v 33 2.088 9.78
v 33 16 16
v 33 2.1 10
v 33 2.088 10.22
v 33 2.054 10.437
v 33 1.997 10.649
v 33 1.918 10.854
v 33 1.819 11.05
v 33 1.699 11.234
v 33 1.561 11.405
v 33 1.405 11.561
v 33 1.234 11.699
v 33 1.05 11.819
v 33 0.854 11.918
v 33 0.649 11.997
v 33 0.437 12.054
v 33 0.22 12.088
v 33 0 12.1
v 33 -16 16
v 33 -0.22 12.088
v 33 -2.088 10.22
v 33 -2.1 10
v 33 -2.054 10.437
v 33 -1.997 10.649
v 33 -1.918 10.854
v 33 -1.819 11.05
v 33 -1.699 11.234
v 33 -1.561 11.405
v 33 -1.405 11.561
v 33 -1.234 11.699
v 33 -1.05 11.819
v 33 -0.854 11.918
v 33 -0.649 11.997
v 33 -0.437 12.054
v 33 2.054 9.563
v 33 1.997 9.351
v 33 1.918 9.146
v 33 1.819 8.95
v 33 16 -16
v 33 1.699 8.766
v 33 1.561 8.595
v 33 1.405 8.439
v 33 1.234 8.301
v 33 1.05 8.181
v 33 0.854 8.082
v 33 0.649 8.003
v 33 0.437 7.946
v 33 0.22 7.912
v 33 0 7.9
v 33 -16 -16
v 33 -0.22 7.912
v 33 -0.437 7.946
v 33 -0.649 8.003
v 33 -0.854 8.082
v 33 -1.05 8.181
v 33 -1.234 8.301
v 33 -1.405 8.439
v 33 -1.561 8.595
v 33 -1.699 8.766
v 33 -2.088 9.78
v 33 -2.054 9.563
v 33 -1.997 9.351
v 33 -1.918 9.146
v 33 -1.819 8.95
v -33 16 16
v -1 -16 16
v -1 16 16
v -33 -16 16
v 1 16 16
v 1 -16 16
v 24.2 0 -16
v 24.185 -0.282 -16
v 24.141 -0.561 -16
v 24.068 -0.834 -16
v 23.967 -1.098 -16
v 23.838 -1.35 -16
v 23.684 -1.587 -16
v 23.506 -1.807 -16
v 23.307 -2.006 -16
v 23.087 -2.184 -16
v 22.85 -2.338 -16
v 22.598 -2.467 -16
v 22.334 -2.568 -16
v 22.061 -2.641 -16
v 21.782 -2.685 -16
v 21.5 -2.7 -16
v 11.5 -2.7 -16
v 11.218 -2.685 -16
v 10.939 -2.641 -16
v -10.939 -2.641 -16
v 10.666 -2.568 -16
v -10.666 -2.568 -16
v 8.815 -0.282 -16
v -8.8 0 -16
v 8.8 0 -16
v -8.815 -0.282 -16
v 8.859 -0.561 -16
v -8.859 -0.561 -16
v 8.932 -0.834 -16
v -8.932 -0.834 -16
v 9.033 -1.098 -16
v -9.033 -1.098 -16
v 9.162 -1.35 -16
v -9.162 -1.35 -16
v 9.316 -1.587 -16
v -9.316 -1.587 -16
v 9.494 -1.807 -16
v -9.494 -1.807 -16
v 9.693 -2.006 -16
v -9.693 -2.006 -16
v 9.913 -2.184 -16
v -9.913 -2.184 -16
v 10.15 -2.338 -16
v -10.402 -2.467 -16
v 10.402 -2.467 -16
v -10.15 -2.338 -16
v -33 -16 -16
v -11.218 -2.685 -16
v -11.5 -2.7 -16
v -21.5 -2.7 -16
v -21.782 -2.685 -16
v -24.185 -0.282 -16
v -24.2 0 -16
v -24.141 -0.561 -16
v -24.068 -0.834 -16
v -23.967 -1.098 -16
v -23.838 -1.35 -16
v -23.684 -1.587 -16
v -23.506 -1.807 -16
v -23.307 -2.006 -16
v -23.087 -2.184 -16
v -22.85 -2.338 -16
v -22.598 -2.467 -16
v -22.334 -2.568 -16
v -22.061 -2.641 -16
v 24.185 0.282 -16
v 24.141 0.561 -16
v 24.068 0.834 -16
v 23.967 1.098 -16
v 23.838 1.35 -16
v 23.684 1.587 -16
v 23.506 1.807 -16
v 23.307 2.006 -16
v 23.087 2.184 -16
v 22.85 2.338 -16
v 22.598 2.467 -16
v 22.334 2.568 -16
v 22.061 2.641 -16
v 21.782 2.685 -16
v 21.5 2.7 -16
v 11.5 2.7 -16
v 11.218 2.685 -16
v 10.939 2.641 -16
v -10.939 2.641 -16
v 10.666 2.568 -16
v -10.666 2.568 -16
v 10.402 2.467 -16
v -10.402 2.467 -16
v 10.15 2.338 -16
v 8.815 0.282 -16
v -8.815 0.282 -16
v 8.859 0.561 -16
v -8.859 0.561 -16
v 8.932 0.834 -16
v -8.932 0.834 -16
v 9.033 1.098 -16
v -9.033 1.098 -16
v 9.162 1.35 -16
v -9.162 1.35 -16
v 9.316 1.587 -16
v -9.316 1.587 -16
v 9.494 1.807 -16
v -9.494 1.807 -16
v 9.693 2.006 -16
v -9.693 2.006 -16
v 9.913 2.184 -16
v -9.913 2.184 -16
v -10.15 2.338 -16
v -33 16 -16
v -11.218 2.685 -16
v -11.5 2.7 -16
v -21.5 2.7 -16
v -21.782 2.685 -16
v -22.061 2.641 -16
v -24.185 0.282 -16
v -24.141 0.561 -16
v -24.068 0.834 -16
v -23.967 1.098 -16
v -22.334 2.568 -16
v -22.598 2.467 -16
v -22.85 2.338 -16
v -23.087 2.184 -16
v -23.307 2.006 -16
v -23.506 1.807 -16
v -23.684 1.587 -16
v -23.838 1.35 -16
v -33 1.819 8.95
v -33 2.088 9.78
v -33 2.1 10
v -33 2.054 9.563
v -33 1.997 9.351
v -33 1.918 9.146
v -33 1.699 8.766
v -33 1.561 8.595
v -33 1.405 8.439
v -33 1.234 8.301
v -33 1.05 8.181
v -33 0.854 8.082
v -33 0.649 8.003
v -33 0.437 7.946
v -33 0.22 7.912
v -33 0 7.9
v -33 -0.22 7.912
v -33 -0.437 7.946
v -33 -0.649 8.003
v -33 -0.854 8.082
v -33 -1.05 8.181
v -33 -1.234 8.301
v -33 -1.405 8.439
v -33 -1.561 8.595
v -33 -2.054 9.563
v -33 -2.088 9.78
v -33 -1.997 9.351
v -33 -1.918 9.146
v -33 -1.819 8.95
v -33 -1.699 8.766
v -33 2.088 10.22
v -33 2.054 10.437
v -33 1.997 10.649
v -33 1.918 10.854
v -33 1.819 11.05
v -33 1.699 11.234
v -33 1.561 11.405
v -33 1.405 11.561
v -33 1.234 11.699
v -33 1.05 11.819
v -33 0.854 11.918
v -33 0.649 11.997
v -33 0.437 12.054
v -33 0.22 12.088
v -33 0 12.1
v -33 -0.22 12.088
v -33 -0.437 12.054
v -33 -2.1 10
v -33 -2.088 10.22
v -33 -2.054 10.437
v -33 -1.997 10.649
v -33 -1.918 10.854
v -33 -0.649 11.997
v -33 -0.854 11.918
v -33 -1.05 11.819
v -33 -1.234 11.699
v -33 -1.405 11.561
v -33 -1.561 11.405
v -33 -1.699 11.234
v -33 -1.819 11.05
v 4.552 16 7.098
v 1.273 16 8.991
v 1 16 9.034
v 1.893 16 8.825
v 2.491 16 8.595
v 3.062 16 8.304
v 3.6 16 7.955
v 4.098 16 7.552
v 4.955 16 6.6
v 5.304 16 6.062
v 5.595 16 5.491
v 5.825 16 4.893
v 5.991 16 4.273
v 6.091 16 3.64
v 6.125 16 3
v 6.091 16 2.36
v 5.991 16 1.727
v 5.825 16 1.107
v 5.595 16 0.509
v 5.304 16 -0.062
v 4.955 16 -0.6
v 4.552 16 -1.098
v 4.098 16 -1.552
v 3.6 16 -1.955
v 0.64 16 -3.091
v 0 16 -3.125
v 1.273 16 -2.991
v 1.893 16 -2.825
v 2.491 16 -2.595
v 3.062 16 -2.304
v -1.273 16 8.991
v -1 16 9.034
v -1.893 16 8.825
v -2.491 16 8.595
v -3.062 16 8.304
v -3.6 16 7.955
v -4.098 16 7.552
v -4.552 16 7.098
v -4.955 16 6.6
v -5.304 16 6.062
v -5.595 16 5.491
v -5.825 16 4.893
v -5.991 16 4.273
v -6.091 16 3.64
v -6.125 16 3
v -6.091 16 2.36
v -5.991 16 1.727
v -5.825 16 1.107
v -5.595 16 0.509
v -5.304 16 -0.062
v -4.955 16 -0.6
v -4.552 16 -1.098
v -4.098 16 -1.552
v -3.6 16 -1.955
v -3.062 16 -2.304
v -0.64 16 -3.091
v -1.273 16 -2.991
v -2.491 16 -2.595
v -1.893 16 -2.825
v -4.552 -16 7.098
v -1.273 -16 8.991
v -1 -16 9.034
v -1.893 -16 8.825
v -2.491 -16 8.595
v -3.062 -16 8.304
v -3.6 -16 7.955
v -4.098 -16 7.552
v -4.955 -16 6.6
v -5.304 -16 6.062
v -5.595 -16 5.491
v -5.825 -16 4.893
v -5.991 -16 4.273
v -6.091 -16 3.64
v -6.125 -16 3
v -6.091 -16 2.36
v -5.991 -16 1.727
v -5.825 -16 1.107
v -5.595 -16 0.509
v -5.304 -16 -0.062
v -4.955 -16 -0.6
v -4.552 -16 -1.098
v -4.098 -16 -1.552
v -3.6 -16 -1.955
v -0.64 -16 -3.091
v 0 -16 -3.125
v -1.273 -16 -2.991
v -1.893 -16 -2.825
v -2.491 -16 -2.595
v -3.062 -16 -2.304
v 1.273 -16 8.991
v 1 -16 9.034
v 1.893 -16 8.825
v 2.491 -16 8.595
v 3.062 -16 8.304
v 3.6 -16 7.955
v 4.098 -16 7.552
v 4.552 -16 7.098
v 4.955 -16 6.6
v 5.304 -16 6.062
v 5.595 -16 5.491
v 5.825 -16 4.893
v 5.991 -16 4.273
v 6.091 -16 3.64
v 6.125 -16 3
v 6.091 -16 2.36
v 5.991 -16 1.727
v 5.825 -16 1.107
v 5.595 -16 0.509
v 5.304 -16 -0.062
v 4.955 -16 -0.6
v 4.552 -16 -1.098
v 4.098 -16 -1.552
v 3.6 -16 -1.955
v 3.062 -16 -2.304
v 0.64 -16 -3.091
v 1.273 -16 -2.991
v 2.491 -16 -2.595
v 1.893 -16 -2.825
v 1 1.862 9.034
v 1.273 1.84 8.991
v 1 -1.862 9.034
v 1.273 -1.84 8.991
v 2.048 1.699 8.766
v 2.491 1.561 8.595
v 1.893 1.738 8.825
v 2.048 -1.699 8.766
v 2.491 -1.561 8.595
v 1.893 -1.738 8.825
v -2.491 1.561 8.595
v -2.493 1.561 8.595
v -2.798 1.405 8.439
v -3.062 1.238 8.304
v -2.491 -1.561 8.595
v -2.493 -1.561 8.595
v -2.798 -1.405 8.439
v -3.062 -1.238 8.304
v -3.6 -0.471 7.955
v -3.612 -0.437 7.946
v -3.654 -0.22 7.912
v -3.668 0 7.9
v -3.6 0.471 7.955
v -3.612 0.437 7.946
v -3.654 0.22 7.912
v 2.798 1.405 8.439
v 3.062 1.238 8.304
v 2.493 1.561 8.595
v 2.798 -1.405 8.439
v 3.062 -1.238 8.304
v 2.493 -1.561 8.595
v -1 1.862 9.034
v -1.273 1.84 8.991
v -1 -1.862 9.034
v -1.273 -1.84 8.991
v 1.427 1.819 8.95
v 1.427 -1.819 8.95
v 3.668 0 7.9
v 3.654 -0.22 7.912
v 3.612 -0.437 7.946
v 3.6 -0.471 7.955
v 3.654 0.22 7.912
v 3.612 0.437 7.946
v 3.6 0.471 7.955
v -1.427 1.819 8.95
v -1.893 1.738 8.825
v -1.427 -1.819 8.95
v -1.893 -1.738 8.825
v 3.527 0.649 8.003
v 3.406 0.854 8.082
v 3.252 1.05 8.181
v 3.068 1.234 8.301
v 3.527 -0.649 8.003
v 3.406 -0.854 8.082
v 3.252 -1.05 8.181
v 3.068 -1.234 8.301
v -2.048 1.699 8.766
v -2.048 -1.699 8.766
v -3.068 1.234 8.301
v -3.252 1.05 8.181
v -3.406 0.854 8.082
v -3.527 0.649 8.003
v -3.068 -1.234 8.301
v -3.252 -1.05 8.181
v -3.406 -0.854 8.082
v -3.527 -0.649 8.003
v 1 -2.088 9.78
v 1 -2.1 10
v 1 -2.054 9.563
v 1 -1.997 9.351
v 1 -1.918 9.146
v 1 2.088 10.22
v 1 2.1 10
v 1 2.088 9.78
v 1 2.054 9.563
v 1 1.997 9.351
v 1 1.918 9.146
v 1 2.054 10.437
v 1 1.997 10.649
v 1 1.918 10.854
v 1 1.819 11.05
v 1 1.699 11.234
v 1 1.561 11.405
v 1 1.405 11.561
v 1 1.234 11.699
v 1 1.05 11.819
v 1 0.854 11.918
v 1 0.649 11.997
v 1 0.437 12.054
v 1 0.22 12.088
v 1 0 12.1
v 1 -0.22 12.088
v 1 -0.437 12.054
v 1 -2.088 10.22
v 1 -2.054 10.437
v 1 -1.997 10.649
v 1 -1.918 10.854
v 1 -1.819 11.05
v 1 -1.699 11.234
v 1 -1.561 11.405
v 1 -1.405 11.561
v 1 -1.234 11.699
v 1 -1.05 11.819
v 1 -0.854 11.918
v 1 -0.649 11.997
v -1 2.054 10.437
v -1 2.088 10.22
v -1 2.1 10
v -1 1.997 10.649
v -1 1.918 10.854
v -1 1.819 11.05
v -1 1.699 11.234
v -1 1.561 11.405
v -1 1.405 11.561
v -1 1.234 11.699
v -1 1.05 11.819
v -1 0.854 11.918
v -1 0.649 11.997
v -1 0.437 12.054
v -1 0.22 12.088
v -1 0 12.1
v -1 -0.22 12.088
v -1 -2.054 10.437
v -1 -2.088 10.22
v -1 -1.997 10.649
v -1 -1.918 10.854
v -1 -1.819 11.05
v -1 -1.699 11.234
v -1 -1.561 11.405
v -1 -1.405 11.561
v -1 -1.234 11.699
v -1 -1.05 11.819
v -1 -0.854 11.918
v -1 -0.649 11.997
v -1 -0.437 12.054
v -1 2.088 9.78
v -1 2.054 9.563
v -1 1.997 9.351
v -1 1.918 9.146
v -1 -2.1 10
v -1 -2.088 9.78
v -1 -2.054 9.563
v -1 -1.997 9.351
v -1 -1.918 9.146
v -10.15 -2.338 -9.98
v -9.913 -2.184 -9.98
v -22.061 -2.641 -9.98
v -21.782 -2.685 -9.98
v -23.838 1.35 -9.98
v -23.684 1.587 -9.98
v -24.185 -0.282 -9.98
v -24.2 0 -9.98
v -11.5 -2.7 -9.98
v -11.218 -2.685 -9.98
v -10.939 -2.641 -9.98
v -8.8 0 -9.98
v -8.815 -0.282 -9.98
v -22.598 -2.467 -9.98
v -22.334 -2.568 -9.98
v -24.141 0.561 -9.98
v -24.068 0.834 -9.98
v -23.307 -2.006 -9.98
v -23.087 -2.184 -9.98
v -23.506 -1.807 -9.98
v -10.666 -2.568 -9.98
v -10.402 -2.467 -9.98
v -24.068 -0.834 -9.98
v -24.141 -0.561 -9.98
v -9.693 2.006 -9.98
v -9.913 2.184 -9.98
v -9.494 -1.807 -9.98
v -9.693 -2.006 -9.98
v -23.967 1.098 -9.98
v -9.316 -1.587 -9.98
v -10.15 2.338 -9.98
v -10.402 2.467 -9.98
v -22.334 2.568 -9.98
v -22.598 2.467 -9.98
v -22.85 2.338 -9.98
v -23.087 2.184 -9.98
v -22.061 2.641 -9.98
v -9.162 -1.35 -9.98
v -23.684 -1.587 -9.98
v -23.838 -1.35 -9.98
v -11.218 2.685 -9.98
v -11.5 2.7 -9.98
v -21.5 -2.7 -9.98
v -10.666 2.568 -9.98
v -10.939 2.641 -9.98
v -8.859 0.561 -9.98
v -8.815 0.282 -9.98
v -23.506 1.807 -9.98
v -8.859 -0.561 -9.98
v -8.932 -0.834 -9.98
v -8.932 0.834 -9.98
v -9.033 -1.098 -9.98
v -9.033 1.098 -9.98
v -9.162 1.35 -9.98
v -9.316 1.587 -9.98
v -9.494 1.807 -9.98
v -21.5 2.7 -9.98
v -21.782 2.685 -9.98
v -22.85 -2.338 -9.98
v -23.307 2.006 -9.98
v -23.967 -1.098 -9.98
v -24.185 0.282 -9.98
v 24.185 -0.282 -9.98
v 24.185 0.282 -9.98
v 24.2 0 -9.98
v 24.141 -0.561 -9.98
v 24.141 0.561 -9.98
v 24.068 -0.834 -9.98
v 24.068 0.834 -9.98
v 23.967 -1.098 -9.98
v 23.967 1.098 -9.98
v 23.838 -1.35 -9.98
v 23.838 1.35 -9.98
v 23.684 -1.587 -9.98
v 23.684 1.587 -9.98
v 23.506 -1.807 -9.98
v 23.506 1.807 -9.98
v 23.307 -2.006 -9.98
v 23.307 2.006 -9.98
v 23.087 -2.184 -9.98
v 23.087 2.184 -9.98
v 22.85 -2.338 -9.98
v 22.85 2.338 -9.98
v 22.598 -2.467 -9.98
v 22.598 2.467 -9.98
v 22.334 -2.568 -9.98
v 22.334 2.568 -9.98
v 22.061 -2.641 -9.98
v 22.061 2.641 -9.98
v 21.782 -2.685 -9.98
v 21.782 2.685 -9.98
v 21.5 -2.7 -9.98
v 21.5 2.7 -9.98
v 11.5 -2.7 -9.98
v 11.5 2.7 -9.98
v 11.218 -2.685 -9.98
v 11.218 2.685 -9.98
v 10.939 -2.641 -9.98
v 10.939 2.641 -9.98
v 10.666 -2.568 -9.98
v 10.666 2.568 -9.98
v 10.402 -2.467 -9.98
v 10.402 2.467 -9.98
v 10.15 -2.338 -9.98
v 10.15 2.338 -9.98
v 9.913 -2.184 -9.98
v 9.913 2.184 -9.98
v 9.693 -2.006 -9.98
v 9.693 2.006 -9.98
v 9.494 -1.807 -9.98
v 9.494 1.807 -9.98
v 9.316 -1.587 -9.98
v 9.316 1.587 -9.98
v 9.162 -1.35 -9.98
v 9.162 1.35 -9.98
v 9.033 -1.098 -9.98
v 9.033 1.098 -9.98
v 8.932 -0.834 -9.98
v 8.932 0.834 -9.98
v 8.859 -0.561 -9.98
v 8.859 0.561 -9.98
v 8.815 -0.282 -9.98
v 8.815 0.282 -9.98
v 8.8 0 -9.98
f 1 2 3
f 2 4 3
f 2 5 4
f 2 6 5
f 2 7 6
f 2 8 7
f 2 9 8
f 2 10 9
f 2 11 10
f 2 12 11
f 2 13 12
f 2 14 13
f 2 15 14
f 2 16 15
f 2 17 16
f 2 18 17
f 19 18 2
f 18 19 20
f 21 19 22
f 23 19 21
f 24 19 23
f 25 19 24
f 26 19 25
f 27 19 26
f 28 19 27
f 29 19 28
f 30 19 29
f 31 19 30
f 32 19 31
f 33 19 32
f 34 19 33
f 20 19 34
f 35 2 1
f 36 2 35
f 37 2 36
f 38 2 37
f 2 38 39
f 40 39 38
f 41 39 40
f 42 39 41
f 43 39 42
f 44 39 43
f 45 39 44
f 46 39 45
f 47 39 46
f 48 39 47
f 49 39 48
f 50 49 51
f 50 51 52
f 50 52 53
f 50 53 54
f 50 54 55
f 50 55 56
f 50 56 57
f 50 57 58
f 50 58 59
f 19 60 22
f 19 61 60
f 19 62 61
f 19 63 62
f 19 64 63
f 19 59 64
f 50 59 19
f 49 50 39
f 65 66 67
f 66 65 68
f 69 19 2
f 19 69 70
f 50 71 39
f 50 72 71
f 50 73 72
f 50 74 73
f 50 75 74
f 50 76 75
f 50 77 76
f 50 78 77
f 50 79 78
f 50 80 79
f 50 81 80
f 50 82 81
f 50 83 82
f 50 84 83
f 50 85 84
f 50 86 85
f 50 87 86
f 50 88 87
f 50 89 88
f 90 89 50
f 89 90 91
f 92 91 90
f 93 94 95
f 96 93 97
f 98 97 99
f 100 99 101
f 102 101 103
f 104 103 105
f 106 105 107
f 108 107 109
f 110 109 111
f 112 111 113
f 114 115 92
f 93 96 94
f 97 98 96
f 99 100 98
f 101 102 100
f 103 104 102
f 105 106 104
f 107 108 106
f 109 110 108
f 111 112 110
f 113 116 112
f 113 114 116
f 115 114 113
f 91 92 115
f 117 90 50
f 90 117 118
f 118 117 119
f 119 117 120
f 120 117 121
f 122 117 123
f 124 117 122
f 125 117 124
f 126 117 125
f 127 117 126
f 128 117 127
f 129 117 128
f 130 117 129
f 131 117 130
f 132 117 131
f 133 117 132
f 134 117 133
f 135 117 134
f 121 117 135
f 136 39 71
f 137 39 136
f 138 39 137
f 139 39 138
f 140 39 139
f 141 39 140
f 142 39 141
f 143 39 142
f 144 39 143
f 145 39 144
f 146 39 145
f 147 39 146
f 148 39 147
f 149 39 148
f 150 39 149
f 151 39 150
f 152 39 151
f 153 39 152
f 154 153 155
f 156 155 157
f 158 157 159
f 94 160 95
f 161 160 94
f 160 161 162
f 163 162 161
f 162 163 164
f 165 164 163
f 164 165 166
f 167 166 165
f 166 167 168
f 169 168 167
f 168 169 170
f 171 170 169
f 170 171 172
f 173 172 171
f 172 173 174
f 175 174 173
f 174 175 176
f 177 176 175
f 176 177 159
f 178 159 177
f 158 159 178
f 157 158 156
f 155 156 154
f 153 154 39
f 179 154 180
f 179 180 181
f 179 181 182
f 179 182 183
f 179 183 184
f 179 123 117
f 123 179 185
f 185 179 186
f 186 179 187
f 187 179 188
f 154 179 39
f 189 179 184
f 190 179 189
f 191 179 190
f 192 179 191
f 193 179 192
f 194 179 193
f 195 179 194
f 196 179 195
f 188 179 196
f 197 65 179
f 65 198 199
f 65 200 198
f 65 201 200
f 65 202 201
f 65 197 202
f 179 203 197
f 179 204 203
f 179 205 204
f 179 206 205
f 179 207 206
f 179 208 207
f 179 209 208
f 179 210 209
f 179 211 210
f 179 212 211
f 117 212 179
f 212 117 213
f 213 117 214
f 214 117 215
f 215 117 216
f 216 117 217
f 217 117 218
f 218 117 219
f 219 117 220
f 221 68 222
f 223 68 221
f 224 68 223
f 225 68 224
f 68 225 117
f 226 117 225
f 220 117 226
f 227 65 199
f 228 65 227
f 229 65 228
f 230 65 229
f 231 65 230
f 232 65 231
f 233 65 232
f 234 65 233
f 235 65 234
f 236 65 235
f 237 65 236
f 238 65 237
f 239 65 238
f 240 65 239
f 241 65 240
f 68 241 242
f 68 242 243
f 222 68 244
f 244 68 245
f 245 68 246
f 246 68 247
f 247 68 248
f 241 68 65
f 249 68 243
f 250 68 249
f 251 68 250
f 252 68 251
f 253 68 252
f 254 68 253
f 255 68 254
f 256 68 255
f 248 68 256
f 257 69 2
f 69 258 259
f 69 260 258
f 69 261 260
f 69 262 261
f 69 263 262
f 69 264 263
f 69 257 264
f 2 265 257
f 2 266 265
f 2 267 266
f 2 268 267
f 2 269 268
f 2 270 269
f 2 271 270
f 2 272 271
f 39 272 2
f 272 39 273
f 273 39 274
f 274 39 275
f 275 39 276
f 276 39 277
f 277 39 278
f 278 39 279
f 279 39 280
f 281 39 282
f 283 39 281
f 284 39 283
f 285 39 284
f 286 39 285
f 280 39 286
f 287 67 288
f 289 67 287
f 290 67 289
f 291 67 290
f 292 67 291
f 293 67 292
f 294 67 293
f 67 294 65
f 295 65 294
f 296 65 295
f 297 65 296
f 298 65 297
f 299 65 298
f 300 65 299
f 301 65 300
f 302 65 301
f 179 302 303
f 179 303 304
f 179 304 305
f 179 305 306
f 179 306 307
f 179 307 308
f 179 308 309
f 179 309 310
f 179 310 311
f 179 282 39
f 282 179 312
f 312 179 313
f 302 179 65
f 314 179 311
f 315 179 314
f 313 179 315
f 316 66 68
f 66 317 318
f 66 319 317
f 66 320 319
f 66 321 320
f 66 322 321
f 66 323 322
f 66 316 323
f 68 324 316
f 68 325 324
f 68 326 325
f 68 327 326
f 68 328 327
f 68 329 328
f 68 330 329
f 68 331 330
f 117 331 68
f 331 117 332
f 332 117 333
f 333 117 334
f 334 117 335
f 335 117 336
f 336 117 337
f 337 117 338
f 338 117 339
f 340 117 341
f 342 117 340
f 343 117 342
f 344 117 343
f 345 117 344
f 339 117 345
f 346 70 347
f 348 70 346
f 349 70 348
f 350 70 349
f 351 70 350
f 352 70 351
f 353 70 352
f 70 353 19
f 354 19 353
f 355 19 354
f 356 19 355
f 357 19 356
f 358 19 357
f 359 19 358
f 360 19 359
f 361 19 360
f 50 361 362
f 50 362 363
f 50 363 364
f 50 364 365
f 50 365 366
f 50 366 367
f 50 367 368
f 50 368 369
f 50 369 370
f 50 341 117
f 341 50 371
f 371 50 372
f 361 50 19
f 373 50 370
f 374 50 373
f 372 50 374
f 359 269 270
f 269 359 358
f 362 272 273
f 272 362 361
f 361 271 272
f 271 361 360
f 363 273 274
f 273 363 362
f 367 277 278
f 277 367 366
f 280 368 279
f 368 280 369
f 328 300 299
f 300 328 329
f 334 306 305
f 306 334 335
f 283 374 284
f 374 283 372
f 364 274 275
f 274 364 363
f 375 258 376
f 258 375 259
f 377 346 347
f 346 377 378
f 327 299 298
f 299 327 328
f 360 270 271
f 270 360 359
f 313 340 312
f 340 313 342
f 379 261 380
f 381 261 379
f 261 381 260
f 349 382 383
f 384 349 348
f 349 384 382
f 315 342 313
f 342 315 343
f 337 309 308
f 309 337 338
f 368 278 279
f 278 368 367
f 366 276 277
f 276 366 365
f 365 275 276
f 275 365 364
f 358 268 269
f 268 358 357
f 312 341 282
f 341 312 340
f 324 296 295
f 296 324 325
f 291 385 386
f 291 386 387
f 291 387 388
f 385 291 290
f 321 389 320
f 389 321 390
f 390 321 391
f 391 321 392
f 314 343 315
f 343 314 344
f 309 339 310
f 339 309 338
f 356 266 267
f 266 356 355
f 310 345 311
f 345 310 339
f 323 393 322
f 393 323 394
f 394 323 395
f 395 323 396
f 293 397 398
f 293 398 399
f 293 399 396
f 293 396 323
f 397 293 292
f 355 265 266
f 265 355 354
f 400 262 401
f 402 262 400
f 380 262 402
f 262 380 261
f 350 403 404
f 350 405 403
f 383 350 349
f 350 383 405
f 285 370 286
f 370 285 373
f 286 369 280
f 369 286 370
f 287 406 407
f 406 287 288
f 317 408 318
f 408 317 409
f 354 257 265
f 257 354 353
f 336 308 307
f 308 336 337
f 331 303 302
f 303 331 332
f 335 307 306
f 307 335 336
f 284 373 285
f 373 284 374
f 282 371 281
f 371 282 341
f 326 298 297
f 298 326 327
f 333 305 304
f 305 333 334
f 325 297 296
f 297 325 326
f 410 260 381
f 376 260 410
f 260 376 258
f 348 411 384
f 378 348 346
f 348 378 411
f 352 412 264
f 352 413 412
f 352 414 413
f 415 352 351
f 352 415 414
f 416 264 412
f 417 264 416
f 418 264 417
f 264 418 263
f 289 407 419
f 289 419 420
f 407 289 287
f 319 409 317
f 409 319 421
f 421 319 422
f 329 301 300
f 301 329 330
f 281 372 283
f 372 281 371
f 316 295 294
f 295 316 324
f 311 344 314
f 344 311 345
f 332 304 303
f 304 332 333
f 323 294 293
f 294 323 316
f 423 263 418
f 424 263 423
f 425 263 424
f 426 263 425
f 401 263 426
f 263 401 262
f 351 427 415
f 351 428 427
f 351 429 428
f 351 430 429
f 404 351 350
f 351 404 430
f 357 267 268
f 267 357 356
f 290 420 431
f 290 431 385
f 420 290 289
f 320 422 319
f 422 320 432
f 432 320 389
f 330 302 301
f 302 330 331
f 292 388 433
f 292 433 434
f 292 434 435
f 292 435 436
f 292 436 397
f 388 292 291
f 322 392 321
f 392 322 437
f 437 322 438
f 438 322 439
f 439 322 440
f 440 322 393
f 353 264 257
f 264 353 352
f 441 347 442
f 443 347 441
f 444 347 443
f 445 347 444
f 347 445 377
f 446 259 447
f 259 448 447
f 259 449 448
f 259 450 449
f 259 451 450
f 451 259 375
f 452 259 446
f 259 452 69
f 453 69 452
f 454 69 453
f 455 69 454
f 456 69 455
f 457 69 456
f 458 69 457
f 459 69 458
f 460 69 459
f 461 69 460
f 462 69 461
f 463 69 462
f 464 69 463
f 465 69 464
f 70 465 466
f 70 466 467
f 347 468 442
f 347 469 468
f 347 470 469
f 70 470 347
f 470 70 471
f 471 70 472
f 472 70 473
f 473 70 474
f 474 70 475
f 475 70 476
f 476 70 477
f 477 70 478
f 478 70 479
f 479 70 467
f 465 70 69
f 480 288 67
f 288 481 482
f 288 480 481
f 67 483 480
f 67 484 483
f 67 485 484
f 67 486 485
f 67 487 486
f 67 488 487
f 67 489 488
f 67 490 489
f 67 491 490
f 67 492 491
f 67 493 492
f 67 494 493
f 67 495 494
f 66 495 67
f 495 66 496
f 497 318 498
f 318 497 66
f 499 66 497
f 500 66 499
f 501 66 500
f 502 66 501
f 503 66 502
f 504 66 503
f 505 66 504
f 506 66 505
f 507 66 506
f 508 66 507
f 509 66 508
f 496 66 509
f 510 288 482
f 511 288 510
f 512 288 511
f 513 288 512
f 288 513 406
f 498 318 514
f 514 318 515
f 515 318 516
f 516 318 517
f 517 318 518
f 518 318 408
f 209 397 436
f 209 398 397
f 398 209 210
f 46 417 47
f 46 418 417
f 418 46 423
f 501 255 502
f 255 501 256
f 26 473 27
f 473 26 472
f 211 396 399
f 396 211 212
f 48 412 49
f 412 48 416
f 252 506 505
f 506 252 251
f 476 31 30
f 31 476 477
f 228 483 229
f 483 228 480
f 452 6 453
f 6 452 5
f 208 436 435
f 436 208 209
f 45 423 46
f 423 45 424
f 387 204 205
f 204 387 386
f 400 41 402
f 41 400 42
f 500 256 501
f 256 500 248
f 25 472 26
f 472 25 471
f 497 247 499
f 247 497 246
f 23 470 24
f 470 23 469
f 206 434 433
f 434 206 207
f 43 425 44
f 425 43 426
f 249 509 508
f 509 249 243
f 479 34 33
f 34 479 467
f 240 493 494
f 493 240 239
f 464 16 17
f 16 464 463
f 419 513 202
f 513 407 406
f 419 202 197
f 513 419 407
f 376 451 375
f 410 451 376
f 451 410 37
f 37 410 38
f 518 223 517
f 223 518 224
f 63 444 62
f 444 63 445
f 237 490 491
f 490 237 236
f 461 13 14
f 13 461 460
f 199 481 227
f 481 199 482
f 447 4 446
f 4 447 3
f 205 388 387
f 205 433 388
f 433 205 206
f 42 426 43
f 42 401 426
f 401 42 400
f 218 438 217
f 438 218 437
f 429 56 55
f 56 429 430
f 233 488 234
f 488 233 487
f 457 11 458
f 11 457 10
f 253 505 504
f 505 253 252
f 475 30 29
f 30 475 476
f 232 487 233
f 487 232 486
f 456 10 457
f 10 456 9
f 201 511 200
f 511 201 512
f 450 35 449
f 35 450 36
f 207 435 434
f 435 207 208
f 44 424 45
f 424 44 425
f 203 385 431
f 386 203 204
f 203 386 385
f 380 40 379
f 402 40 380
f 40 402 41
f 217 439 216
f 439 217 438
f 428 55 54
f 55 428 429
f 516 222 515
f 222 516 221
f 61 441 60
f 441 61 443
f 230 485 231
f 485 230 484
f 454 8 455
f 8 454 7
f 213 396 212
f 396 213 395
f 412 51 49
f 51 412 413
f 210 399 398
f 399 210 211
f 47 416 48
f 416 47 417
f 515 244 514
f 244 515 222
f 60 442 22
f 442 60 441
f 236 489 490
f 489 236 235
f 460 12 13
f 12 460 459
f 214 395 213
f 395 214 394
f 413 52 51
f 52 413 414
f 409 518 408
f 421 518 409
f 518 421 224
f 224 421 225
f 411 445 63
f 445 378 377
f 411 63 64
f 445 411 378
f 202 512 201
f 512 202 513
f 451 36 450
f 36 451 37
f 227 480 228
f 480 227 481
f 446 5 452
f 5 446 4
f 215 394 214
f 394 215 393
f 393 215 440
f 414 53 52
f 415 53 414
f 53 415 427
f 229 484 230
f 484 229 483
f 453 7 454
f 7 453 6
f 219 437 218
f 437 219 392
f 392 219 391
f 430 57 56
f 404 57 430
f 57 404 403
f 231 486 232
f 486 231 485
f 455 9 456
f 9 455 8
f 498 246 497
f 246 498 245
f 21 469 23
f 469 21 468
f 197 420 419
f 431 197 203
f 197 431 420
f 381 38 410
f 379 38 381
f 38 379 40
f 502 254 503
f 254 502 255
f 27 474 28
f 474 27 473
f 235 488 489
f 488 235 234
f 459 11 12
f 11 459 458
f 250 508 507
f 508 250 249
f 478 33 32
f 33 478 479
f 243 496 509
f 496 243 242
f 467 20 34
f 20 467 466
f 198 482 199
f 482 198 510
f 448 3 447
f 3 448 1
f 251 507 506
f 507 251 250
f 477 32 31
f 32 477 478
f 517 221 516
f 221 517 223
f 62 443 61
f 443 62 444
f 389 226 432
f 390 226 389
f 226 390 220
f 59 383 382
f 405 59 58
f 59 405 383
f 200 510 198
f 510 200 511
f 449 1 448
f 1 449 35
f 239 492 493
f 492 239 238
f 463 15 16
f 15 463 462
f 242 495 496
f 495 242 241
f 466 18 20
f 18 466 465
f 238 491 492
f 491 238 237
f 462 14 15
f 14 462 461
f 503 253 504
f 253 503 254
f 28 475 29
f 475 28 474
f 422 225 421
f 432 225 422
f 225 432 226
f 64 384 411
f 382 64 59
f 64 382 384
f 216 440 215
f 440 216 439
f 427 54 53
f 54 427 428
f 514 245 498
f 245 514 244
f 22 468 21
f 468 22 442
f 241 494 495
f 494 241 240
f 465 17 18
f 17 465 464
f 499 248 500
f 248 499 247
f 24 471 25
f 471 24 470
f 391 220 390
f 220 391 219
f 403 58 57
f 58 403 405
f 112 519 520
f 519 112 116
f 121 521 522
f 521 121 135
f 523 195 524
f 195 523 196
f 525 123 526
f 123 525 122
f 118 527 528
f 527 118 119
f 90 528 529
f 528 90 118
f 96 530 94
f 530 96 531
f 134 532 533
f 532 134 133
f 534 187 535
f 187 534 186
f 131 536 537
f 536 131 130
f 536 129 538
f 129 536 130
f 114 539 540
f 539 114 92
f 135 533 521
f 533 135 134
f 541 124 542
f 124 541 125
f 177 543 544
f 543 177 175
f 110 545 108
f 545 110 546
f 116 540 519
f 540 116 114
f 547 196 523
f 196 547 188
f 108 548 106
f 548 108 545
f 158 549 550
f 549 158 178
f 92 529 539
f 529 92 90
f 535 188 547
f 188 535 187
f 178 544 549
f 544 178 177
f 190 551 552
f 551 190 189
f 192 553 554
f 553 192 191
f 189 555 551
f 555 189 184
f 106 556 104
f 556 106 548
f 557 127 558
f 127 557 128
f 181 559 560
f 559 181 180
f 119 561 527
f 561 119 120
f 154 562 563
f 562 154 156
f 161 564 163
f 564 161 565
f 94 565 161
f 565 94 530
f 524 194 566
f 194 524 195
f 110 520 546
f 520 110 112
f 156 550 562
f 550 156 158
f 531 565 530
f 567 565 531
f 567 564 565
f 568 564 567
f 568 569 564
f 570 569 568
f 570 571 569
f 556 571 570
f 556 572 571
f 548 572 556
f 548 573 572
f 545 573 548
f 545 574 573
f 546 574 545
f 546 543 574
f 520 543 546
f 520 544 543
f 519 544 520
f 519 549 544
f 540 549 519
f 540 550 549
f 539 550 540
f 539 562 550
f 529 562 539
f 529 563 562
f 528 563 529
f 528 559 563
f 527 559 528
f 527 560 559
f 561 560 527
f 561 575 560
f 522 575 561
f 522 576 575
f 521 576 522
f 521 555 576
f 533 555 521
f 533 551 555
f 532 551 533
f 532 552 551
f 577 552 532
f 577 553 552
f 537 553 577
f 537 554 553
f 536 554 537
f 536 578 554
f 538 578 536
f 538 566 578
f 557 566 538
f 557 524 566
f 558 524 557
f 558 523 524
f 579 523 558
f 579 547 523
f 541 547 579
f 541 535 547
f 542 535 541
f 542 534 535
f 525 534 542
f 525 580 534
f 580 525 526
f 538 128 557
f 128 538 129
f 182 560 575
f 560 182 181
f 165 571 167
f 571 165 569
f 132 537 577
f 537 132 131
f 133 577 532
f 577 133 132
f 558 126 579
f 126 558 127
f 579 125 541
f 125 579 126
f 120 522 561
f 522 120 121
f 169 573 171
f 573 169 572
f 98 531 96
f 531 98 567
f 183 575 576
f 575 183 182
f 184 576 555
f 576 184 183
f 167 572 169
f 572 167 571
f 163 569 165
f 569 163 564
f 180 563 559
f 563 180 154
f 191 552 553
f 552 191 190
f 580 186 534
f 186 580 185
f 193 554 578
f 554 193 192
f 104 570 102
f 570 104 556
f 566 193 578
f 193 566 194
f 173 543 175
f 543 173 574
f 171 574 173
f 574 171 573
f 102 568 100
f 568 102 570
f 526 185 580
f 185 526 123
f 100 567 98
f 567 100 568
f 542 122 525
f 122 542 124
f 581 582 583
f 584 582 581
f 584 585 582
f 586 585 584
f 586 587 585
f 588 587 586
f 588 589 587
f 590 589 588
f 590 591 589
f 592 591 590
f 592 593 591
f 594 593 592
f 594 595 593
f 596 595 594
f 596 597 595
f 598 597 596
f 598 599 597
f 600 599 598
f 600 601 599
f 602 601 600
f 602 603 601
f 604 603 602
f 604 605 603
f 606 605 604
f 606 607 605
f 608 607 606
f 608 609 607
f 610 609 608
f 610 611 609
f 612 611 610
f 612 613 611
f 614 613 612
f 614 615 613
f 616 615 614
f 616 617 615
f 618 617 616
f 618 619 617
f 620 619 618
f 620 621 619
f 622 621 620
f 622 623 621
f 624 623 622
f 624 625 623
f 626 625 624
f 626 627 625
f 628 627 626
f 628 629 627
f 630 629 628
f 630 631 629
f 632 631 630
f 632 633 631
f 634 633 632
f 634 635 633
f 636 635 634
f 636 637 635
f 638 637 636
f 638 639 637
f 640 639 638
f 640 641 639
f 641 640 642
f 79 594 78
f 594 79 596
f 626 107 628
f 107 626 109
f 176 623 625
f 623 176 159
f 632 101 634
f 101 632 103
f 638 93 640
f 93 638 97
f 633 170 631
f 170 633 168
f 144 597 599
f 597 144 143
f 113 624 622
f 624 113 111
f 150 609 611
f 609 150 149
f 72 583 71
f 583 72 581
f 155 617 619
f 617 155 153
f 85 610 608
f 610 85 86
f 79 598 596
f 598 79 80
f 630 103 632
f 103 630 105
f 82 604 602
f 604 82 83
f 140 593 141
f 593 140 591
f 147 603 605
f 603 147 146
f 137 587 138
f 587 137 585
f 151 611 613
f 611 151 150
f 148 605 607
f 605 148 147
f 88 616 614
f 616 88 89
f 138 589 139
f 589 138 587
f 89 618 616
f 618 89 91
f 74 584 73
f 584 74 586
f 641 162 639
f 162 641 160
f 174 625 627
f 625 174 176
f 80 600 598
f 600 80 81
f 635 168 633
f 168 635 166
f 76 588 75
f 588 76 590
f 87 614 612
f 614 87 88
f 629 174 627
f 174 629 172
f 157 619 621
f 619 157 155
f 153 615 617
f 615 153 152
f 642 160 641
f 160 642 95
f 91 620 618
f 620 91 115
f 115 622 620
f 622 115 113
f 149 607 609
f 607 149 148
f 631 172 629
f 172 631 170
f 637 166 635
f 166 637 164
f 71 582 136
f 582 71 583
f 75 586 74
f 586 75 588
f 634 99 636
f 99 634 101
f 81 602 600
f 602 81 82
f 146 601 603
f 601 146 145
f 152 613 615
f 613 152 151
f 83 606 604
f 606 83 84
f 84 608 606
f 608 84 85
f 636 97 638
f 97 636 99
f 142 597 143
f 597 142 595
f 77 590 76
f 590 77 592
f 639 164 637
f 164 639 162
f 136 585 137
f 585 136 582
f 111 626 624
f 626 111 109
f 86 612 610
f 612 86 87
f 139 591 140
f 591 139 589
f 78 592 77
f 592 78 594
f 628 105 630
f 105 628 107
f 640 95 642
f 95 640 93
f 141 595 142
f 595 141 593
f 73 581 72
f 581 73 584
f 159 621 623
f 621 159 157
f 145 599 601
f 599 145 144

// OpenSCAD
// Clamp pedestal for 12 mm shaft.
$fn = 60;
eps = 0.02;
shaft_d = 12;
body_l = 66;
body_d = 32;
body_h = 32;
base_t = 6;
slot_w = 2;
mount_d = 5.4;
module mount_slot(x) {
    hull() {
        translate([x - 5, 0, -body_h / 2 - eps]) cylinder(d = mount_d, h = base_t + 2 * eps);
        translate([x + 5, 0, -body_h / 2 - eps]) cylinder(d = mount_d, h = base_t + 2 * eps);
    }
}
difference() {
    cube([body_l, body_d, body_h], center = true);
    translate([0, -body_d / 2 - eps, 3]) rotate([-90, 0, 0]) cylinder(d = shaft_d + 0.25, h = body_d + 2 * eps);
    translate([-slot_w / 2, -body_d / 2 - eps, 3]) cube([slot_w, body_d + 2 * eps, body_h / 2 + eps]);
    translate([-body_l / 2 - eps, 0, body_h / 2 - 6]) rotate([0, 90, 0]) cylinder(d = 4.2, h = body_l + 2 * eps);
    mount_slot(-body_l / 4);
    mount_slot(body_l / 4);
}
